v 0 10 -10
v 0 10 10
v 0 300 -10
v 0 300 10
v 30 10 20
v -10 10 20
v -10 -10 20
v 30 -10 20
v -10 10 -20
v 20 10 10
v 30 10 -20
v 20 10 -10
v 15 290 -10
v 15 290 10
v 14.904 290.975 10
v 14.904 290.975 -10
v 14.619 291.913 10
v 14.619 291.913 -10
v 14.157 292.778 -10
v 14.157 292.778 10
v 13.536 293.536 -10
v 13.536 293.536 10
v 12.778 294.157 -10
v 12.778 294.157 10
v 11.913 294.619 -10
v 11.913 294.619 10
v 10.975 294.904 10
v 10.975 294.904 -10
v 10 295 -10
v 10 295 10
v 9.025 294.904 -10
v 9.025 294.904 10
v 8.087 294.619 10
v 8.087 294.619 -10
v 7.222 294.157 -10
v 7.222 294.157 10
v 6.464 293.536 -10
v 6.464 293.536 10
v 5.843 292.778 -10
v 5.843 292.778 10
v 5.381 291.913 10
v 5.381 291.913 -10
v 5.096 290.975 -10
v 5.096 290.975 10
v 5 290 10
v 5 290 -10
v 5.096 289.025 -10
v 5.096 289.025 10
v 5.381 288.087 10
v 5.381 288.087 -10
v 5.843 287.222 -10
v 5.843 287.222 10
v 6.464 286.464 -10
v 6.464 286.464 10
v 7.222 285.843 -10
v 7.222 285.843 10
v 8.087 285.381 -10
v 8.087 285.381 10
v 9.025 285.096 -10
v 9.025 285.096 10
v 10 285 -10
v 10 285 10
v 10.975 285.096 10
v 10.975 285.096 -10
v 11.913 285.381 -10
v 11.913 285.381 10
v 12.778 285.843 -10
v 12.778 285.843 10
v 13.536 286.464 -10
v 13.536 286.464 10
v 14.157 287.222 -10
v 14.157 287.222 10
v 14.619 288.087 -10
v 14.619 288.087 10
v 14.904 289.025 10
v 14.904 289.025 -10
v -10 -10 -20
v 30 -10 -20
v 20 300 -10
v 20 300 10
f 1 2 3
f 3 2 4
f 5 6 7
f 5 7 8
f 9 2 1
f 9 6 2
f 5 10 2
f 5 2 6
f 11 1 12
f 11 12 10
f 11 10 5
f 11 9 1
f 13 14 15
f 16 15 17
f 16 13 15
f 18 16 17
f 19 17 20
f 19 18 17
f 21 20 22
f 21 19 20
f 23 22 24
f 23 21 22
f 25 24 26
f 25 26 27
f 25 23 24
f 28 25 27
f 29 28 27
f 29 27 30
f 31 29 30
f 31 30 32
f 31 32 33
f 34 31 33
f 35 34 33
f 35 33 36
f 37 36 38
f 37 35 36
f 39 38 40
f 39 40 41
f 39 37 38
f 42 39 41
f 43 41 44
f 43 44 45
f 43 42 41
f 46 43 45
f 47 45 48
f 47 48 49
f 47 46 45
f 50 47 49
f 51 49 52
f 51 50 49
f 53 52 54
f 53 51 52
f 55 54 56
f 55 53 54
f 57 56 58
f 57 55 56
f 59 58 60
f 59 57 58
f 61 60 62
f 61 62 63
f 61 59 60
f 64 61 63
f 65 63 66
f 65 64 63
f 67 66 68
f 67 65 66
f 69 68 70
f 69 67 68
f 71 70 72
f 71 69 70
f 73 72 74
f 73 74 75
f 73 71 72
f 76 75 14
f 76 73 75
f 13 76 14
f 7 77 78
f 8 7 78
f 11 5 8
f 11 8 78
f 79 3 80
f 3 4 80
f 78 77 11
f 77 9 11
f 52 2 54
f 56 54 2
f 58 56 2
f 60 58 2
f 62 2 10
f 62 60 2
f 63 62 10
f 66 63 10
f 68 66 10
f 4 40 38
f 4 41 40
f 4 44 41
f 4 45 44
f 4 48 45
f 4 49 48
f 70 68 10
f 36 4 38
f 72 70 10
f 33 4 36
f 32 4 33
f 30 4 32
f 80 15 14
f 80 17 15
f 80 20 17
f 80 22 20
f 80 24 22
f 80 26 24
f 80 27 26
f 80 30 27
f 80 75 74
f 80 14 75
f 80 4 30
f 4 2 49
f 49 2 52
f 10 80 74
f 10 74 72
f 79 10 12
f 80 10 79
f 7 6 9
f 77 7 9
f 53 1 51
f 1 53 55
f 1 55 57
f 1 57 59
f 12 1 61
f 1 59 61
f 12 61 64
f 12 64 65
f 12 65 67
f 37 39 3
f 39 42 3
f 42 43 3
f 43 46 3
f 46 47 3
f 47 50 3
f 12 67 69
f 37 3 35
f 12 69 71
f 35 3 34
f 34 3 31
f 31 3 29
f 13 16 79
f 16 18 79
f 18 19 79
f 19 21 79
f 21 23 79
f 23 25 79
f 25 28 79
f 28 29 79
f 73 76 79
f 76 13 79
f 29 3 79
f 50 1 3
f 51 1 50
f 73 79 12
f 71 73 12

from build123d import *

# Parameters (mm, degrees)
SKETCH1_W           = 20
SKETCH1_H           = 300
SKETCH1_R           = 5
BOSS_EXTRUDE2_DEPTH = 10
SKETCH5_W           = 40
SKETCH5_H           = 40
BOSS_EXTRUDE3_DEPTH = 10


with BuildPart() as part:
    # Sketch1 → Boss-Extrude2 (new, symmetric)
    with BuildSketch(Plane.XY):
        with Locations((10, 150)):
            Rectangle(SKETCH1_W, SKETCH1_H)
        with Locations((10, 290)):
            Circle(SKETCH1_R, mode=Mode.SUBTRACT)
    extrude(amount=BOSS_EXTRUDE2_DEPTH, both=True)

    # Sketch5 → Boss-Extrude3 (add, symmetric)
    with BuildSketch(Plane(origin=(0, 0, 0), x_dir=(1, 0, 0), z_dir=(0, 1, 0))):
        with Locations((10, 0)):
            Rectangle(SKETCH5_W, SKETCH5_H)
    extrude(amount=BOSS_EXTRUDE3_DEPTH, both=True)


solid = part.part
